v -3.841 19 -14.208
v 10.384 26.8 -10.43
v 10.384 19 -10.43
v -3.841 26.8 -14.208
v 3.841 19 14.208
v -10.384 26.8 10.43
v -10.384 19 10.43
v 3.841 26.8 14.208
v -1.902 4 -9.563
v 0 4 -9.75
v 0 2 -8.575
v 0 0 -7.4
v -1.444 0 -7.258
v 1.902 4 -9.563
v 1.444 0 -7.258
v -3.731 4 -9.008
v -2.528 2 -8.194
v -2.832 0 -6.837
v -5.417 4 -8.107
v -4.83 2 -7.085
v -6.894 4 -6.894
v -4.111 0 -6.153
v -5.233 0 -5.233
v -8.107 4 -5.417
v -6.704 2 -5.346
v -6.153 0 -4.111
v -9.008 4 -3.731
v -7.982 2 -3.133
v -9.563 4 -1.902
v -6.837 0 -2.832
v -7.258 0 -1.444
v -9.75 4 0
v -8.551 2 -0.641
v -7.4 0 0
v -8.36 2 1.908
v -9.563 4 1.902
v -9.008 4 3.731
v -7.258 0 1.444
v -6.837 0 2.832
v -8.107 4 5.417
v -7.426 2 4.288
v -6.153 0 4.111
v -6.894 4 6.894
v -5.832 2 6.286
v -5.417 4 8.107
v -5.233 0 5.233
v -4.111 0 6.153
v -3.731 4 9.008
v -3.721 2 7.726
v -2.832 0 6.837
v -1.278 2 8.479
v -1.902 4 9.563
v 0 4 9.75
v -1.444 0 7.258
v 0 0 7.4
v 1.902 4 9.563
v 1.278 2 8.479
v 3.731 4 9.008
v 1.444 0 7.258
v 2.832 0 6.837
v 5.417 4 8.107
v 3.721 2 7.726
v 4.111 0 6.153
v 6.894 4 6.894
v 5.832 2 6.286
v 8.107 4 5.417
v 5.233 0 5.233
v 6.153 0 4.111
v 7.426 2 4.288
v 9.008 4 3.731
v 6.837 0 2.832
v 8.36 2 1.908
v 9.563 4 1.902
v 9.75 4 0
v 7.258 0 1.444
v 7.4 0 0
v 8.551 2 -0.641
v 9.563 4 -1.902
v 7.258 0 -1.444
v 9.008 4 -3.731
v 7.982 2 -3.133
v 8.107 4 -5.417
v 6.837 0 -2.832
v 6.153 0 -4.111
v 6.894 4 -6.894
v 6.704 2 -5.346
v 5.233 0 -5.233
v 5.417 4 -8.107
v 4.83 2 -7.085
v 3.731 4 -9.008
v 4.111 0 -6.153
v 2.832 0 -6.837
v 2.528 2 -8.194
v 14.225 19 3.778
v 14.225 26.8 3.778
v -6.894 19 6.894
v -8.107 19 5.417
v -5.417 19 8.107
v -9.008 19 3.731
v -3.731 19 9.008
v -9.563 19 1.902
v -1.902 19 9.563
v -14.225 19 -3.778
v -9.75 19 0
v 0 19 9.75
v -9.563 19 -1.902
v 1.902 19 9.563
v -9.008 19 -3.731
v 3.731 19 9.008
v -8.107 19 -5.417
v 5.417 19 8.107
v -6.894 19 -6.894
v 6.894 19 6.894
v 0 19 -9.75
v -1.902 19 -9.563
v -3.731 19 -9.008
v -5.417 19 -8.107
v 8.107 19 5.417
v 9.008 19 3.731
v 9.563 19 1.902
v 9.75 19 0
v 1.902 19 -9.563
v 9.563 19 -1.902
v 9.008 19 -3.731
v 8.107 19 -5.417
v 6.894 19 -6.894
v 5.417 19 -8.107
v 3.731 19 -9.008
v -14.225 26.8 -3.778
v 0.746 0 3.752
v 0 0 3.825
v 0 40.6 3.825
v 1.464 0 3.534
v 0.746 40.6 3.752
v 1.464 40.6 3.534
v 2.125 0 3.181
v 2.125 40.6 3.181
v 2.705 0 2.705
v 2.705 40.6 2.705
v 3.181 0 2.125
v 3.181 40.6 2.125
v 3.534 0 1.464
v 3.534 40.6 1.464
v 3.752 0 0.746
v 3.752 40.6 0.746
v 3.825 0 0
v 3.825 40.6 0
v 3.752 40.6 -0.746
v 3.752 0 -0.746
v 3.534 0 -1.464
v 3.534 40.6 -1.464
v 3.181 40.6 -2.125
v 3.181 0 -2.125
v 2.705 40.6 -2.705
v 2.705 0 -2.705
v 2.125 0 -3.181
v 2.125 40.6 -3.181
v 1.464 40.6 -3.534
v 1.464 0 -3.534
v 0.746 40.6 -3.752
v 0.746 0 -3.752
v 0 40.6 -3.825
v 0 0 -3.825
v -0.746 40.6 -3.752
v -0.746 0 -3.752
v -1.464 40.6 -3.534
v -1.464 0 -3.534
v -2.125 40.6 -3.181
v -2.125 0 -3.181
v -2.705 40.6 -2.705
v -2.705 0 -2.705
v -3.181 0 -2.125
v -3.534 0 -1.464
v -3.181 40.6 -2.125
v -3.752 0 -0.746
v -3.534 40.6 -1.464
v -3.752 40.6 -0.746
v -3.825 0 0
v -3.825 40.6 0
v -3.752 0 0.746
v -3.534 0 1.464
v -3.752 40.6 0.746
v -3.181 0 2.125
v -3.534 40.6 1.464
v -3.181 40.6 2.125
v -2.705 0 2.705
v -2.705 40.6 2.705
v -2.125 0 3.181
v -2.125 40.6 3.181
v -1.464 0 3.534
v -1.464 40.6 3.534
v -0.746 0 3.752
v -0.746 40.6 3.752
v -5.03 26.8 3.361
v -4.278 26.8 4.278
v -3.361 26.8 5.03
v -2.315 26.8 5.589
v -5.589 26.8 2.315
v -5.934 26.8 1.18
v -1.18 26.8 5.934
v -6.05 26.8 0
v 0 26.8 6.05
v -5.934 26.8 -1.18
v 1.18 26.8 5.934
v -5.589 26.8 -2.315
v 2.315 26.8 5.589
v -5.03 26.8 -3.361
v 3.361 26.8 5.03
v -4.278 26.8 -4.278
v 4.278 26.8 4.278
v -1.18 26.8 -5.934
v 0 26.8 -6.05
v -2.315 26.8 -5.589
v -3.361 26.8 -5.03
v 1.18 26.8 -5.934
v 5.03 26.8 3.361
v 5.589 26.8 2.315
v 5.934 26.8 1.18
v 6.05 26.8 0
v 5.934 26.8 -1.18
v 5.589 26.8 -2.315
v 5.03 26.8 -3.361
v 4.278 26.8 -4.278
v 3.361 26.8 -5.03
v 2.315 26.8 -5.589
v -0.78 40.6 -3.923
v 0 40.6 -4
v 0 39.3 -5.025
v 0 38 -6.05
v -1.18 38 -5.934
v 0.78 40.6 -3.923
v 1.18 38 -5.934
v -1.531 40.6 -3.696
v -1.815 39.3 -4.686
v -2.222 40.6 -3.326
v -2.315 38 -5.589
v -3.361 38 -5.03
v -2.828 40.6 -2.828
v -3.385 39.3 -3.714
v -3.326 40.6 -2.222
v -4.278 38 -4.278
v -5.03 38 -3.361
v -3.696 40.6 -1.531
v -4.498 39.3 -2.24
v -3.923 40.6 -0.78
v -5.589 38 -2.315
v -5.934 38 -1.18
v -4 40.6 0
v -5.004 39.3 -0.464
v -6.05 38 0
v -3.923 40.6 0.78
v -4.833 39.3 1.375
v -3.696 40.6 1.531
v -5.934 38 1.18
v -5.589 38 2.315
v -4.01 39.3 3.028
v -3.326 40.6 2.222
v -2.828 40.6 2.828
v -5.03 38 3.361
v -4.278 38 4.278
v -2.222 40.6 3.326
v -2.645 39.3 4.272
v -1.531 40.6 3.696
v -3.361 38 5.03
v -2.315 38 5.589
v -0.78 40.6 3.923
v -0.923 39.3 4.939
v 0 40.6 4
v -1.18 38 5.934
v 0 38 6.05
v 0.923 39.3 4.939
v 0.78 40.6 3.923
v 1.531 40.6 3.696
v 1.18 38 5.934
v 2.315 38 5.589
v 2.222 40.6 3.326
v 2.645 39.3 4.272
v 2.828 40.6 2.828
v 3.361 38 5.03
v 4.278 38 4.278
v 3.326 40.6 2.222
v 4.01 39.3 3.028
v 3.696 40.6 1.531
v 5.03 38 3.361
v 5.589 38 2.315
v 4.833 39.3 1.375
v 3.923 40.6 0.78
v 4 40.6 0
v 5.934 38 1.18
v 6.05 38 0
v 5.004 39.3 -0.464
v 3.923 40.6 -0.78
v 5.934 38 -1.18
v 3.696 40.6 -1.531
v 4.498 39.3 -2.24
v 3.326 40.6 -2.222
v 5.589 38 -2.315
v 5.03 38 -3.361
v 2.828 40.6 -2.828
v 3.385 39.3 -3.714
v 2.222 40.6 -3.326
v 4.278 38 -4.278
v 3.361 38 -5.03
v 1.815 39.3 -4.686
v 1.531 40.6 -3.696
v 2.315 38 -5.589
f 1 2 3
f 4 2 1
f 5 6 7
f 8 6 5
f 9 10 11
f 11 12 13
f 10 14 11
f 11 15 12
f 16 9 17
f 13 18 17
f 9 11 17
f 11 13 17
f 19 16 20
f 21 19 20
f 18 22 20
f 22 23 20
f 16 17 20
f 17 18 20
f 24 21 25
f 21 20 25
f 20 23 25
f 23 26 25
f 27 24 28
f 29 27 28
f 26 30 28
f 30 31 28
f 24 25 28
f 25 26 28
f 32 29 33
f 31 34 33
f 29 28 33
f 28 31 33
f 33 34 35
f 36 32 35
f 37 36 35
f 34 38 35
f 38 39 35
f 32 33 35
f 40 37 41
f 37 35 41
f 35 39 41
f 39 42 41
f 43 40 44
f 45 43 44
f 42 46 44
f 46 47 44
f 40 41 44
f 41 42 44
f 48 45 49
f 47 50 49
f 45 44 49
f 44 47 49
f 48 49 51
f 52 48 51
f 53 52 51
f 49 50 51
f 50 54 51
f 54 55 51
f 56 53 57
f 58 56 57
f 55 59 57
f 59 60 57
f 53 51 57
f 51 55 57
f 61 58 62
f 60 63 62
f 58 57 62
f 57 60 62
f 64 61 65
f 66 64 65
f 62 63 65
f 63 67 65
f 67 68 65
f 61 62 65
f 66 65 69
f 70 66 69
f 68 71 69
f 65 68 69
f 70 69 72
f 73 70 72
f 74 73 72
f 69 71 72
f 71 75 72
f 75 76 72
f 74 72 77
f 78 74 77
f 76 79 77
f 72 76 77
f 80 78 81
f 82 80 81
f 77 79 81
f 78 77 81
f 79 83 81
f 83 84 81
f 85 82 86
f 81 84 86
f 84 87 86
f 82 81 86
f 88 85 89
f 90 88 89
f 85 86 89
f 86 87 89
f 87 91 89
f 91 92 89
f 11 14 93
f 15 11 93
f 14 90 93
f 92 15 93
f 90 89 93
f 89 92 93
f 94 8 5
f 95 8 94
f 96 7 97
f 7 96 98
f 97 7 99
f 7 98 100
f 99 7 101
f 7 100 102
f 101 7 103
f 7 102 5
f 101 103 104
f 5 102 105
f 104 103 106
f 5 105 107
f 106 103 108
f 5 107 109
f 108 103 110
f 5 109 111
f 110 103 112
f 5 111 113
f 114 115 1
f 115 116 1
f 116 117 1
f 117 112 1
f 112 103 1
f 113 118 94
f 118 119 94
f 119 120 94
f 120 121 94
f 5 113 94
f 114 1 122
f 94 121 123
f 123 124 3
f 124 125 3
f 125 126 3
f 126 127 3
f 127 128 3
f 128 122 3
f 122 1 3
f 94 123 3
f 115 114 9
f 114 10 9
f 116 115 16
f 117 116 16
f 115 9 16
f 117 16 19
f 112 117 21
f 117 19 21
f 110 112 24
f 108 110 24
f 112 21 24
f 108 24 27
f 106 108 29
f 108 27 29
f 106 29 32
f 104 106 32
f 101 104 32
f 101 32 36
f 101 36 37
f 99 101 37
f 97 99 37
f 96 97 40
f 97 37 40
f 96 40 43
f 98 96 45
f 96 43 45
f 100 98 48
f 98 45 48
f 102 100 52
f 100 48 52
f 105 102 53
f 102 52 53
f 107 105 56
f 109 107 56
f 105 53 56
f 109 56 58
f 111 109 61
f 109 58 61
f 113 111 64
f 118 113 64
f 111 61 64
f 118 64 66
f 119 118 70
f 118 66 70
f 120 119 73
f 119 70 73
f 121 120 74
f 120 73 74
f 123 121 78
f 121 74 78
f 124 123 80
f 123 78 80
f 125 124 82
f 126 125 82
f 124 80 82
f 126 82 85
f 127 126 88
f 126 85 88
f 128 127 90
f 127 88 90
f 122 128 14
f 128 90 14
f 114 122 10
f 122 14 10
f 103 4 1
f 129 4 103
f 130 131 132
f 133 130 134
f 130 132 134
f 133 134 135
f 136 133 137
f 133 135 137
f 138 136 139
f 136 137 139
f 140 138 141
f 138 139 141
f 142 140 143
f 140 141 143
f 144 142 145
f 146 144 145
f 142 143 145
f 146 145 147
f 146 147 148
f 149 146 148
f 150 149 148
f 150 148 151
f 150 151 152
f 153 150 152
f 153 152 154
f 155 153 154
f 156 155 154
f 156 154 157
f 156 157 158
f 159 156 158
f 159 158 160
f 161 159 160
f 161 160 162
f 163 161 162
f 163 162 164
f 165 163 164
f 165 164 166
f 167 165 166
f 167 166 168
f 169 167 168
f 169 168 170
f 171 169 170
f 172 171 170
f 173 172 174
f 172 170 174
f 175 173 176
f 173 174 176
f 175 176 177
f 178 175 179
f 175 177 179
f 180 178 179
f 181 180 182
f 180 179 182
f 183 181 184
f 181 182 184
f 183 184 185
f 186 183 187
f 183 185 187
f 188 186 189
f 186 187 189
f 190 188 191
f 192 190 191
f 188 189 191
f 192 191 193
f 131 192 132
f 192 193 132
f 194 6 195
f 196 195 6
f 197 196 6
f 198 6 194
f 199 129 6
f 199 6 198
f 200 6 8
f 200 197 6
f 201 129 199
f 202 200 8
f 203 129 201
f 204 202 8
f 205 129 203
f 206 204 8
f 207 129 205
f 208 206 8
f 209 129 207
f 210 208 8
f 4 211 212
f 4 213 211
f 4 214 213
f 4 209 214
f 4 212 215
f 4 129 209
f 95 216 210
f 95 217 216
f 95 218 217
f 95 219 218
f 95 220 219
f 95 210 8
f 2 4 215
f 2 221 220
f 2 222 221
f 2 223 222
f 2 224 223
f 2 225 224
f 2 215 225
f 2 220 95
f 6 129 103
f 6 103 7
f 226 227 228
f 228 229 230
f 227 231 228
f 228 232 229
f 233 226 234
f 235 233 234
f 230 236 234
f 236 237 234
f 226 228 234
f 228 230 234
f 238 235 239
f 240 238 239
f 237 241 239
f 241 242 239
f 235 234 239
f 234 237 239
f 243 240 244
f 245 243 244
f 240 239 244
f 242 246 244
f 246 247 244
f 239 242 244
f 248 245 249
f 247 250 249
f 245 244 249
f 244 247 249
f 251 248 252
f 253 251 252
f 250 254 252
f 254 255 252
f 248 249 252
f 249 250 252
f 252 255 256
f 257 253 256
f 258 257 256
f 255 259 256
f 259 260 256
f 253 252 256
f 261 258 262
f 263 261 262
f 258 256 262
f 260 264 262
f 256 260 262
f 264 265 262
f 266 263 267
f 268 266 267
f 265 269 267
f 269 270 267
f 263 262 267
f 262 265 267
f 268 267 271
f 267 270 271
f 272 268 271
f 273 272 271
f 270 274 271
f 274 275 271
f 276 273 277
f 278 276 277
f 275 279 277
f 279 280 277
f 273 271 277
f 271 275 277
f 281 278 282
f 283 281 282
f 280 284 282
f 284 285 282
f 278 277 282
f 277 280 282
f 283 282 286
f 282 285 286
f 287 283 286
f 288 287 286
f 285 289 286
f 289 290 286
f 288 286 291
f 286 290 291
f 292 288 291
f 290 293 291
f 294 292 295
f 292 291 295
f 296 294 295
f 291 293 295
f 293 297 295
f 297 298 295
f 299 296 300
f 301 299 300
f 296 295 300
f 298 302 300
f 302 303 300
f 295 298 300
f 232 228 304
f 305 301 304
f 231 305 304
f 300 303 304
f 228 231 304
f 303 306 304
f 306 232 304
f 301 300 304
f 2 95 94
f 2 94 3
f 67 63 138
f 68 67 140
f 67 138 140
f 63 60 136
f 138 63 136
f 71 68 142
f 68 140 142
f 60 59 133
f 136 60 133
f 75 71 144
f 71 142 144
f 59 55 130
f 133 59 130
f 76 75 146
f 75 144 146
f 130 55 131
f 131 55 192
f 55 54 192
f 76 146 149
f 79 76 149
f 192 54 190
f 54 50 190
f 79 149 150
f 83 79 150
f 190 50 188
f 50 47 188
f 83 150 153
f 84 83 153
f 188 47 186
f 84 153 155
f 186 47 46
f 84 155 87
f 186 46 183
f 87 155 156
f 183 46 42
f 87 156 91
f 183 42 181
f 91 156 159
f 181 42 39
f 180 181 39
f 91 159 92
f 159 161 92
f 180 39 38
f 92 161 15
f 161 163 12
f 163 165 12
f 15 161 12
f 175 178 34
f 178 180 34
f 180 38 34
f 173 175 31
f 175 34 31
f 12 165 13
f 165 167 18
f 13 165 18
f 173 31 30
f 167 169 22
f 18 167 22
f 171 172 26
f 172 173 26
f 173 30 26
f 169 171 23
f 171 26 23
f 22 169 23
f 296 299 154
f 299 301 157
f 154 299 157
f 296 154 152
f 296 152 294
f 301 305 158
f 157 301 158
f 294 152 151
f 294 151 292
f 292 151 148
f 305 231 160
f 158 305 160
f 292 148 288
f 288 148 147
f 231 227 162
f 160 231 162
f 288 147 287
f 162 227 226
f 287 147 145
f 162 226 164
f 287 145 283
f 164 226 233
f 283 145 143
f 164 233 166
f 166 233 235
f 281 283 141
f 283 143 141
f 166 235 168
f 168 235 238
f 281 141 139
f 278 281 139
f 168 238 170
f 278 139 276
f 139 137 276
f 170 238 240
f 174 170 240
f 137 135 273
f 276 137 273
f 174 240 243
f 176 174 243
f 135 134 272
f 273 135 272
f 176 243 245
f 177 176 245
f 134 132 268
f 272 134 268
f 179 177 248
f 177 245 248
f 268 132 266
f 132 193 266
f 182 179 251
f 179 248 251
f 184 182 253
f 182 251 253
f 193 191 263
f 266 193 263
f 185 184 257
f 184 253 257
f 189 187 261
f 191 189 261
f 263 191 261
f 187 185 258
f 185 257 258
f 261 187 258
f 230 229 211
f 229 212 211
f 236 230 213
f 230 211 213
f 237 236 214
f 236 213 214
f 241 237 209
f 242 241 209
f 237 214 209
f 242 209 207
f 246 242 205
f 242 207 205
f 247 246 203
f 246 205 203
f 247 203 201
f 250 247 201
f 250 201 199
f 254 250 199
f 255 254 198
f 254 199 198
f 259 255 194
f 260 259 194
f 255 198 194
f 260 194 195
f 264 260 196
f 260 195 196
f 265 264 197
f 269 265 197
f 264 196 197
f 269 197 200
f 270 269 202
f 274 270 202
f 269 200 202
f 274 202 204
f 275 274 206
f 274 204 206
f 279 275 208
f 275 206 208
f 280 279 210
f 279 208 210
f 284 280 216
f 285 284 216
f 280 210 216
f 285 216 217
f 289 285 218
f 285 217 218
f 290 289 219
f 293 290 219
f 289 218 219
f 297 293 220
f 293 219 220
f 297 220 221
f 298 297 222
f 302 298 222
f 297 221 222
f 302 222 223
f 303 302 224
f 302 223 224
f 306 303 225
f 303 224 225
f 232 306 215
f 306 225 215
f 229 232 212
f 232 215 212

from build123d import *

# Parameters (mm, degrees)
BOSS_EXTRUDE1_DEPTH = 7.8
SKETCH4_R           = 3.825420683
CUT_EXTRUDE2_DEPTH  = 46.305179634


with BuildPart() as part:
    # Sketch1 → Revolve1 (revolve)
    with BuildSketch(Plane.XY, mode=Mode.PRIVATE) as revolve1_sk:
        Polygon((0, 0), (0, 40.6), (4, 40.6), (6.05, 38), (6.05, 26.8), (12.7, 26.8), (12.7, 19), (9.75, 19), (9.75, 4), (7.4, 0), align=None)
    revolve(revolve1_sk.sketch.rotate(Axis((0, 0, 0), (0, 1, 0)), 90), axis=Axis((0, 0, 0), (0, 1, 0)))

    # Sketch3 → Boss-Extrude1 (add)
    with BuildSketch(Plane(origin=(0, 26.8, 0), x_dir=(1, 0, 0), z_dir=(0, 1, 0))):
        Polygon((14.224650165, -3.777575457), (10.383801393, 10.430120675), (-3.840848772, 14.207696132), (-14.224650165, 3.777575457), (-10.383801393, -10.430120675), (3.840848772, -14.207696132), align=None)
    extrude(amount=-BOSS_EXTRUDE1_DEPTH)

    # Sketch4 → Cut-Extrude2 (cut, through all)
    with BuildSketch(Plane(origin=(0, 40.6, 0), x_dir=(1, 0, 0), z_dir=(0, 1, 0))):
        with Locations(Location((0, 0, 0), (0, 0, 270))):
            Circle(SKETCH4_R)
    extrude(amount=-CUT_EXTRUDE2_DEPTH, mode=Mode.SUBTRACT)


solid = part.part
